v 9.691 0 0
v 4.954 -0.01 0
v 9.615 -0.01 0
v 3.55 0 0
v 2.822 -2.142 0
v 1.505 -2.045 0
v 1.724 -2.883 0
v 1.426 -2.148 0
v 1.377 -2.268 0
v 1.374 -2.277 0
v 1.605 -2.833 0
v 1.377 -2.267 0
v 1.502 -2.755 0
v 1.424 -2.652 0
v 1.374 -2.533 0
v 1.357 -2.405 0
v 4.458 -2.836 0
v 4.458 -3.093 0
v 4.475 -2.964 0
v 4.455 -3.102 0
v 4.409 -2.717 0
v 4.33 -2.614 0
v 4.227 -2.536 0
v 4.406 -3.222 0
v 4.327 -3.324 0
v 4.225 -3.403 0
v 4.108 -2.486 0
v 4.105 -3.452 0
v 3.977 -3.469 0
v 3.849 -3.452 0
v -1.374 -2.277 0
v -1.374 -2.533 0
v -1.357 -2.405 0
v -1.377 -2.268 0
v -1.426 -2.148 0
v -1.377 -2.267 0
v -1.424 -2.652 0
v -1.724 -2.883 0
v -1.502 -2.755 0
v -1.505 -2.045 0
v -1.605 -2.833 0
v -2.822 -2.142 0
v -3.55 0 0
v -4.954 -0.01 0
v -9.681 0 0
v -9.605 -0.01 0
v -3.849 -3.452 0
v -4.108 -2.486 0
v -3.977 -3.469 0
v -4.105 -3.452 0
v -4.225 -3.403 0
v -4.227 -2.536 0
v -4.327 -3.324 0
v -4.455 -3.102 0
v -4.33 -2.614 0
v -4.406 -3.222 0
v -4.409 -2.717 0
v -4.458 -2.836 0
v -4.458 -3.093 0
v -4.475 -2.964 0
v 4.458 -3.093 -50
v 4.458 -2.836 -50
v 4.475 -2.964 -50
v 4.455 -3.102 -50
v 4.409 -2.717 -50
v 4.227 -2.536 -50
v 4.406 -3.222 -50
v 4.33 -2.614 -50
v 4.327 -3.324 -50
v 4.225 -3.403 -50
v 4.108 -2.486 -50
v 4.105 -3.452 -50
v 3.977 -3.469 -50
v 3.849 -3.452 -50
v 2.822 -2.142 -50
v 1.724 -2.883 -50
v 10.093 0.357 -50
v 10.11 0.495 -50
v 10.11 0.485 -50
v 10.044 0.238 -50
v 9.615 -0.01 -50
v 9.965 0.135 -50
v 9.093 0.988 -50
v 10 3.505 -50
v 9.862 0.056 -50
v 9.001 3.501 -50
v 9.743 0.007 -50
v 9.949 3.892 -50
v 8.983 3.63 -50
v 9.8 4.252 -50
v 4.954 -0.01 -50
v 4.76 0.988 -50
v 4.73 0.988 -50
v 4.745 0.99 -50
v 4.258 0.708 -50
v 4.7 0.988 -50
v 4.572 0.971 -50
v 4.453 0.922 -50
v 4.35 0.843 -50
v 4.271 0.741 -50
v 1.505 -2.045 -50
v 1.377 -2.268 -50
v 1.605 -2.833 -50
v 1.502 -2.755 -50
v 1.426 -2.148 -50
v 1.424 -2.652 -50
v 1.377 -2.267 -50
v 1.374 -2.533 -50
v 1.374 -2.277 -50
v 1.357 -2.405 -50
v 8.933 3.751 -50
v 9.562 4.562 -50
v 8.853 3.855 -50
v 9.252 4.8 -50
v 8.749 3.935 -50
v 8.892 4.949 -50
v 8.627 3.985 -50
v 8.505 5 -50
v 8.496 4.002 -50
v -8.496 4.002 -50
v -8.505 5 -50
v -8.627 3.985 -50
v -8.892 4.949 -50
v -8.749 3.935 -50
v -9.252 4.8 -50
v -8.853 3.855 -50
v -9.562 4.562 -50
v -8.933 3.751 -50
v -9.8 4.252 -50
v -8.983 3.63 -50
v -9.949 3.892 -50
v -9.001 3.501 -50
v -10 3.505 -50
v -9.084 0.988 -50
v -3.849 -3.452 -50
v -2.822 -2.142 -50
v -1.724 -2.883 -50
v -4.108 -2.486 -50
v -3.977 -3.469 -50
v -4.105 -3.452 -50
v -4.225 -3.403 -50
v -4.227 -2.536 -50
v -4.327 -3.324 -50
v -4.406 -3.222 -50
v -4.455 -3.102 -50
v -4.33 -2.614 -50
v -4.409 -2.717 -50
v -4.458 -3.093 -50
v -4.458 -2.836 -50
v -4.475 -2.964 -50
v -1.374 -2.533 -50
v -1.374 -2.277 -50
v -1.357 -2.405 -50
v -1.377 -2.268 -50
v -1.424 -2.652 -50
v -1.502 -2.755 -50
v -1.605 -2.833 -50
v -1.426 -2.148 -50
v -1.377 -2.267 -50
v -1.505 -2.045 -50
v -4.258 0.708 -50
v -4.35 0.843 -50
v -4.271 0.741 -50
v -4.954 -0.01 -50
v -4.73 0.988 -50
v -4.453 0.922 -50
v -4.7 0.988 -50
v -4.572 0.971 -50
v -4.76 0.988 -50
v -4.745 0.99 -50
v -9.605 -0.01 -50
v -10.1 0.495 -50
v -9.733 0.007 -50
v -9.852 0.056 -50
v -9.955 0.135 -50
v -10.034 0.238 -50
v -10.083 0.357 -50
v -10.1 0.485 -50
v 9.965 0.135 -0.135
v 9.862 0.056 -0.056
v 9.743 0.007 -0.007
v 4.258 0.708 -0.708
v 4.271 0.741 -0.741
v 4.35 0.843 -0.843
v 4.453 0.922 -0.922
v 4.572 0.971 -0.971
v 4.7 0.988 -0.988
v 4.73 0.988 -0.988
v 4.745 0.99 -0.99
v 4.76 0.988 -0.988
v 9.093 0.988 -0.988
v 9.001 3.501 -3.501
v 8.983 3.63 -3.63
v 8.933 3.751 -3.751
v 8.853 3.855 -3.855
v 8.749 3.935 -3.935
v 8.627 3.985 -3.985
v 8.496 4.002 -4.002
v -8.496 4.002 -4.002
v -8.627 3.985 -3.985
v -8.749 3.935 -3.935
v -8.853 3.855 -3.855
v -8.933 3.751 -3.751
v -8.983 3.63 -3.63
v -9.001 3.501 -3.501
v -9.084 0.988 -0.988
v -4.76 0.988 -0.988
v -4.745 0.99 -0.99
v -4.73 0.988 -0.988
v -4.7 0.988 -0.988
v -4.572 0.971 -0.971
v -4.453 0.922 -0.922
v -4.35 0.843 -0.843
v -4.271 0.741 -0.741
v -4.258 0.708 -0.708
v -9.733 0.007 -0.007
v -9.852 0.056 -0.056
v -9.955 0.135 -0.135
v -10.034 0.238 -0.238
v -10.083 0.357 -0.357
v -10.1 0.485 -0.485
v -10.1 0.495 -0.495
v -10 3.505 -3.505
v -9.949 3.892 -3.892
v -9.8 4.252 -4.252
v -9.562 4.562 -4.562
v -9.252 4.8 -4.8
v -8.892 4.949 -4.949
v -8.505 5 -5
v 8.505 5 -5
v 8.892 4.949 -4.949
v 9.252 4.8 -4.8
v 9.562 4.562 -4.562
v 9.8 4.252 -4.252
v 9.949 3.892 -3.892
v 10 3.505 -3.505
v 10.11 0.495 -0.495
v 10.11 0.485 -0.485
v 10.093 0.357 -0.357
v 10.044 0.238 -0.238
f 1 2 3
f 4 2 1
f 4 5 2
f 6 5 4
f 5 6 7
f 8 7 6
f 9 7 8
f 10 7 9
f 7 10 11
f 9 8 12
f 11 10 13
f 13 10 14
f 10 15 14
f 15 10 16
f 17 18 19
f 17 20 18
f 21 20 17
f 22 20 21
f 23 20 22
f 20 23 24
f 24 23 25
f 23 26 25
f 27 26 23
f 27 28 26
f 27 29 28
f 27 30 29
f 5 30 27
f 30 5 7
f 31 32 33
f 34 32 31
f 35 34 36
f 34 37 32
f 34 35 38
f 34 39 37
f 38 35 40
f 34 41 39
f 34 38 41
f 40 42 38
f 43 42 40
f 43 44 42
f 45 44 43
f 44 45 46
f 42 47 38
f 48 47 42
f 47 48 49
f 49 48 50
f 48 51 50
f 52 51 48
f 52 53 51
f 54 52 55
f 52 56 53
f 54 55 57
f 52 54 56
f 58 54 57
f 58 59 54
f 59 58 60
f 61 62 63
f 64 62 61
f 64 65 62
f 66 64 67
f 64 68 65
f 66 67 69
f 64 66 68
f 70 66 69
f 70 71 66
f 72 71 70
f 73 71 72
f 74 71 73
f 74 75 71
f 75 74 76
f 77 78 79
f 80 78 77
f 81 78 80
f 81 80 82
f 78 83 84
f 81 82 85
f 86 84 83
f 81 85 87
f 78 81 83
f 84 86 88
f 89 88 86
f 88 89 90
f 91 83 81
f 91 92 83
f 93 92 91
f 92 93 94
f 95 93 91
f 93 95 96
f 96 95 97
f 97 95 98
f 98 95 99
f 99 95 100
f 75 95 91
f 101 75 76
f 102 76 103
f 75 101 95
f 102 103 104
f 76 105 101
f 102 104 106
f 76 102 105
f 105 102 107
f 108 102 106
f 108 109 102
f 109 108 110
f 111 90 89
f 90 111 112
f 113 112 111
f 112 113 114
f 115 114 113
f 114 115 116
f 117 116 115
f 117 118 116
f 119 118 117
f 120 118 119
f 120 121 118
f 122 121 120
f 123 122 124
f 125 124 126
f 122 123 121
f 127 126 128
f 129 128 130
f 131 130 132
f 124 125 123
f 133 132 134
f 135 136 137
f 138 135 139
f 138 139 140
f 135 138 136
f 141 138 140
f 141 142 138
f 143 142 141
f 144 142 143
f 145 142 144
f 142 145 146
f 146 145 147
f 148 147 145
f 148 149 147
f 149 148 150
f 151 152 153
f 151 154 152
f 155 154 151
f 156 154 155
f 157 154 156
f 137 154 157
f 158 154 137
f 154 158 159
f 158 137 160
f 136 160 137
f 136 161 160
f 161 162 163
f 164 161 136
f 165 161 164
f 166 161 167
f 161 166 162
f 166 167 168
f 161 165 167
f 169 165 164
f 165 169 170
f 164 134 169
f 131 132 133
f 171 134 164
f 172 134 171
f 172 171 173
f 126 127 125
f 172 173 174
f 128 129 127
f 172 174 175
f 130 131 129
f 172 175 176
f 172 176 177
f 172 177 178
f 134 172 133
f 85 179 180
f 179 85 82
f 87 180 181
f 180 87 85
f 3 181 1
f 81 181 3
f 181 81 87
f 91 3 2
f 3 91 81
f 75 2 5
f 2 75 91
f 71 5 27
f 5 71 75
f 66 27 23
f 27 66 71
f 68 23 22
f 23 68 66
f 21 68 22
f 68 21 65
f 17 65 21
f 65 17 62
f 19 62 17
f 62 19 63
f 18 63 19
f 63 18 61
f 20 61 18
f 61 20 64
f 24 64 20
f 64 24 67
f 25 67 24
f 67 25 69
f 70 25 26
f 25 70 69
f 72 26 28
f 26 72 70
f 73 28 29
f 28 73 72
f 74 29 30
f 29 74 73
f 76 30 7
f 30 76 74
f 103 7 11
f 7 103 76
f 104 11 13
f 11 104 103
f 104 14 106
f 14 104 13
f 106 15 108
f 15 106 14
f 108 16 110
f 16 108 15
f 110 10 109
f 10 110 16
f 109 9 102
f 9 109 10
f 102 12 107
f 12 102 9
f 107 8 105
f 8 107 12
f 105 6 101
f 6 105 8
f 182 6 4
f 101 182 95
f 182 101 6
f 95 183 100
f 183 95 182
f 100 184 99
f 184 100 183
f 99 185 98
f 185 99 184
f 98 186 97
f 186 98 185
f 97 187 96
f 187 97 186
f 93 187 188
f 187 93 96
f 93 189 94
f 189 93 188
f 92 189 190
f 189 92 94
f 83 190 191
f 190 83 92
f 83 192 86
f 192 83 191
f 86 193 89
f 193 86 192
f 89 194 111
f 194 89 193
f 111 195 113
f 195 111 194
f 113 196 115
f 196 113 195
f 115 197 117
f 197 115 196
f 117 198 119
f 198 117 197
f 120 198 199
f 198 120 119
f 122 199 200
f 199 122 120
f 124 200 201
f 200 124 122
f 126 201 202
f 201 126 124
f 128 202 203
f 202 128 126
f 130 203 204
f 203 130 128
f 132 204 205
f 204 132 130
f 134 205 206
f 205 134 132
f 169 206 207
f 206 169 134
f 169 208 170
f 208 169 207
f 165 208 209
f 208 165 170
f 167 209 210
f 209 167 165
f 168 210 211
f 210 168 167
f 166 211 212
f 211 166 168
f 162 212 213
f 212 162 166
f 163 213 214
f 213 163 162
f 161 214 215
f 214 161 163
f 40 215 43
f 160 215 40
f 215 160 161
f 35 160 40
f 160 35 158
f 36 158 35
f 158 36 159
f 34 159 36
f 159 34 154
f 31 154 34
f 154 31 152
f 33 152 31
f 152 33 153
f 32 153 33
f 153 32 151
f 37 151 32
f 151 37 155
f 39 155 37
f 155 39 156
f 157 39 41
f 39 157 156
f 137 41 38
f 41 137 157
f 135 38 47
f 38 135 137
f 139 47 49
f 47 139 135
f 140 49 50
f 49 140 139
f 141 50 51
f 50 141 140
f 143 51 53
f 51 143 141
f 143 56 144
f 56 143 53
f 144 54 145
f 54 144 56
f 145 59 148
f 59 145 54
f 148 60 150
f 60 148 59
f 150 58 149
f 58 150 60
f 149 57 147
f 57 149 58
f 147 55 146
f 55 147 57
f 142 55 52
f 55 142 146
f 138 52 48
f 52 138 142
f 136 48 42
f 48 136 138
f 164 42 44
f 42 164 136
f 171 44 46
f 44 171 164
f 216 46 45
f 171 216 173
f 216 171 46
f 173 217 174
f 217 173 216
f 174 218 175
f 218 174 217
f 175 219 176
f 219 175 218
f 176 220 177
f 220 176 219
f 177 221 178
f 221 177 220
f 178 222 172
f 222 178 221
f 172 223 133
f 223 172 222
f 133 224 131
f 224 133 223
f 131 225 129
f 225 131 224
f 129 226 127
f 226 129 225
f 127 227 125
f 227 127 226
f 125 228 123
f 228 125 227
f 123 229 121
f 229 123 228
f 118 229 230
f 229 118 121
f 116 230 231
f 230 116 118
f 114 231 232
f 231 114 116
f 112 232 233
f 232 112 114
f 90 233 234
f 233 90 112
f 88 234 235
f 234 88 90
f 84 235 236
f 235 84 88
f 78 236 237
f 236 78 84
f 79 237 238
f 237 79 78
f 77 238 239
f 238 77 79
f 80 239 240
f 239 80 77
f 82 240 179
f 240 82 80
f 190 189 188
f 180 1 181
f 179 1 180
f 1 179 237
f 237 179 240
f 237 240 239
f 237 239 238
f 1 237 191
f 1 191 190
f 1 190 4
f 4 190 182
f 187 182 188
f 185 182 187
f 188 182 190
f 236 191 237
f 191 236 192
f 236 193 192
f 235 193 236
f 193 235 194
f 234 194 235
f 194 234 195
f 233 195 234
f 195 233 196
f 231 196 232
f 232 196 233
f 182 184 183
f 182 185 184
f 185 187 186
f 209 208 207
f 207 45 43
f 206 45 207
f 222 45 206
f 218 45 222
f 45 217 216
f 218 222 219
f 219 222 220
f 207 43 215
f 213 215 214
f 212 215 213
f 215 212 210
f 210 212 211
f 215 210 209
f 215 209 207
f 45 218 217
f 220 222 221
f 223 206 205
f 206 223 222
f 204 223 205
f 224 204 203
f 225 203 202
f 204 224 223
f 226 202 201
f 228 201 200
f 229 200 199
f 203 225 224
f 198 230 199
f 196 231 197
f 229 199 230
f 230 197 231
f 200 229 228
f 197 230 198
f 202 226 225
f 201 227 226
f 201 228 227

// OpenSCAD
l=50;  // Length of channel
d=5;  // Depth (outside), 3 mm min
cR=1;  // Radius for Rounding of corners
slop=0.1;  // Not too tight
w=0.01;  // Line width for initial drawing. We then widen it to 2 times nozzle diameter
nz=0.5 - w/2; // Nozzle diameter for vase mode
tT=1.8+slop; // Tslot thickness of lip
lC=2.2; // Length of retainer
t=0.1;  // Extra width for tension
tG=6-slop+2*t; // Tslot gap
end_angle=45;//inner corner cut
endL=10+1;
endH=d+1;
rotate([180,0,0])
render(convexity = 6)
difference() {
linear_extrude(height=l) cablehouse();
rotate([end_angle,0,0])
translate([-endL,-endH,0,])
cube([2*endL,endH,endH/sin(end_angle)]);
}

module cablehouse()
{
   minkowski()
   {
       union()
       {
           channelb();
           clip();
           mirror([1,0,0]) clip();
       }
       circle(r=nz,$fn=24);
   }
}

module channelb()
{
   translate([0,-d/2]) difference()
   {
       channela();
       scale([1-2*w/20,1-2*w/d]) channela();
       translate([0,d/2]) square([tG+tT+2*nz*1.41428,4*nz],center=true);
   }
}

module channela()
{
   translate([0,d/2]) hull()
   {
       translate([10-nz+t,-nz]) square([w,w]);
       translate([-(10-nz+t),-nz]) square([w,w]);
       translate([-(10-nz-cR),-d+nz+cR]) circle(r=cR,$fn=24);
       translate([(10-nz-cR),-d+nz+cR]) circle(r=cR,$fn=24);
   }
}

module clip()
{
   l1 = (tT+2*nz)*1.41428;
   translate([tG/2+tT-nz*1.41428,0]) rotate([0,0,45]) translate([0,-nz*1.41428]) square([w,l1]);
   translate([tG/2-2.41428*nz,(tT+nz)]) rotate([0,0,15])square([lC,w]);
}
